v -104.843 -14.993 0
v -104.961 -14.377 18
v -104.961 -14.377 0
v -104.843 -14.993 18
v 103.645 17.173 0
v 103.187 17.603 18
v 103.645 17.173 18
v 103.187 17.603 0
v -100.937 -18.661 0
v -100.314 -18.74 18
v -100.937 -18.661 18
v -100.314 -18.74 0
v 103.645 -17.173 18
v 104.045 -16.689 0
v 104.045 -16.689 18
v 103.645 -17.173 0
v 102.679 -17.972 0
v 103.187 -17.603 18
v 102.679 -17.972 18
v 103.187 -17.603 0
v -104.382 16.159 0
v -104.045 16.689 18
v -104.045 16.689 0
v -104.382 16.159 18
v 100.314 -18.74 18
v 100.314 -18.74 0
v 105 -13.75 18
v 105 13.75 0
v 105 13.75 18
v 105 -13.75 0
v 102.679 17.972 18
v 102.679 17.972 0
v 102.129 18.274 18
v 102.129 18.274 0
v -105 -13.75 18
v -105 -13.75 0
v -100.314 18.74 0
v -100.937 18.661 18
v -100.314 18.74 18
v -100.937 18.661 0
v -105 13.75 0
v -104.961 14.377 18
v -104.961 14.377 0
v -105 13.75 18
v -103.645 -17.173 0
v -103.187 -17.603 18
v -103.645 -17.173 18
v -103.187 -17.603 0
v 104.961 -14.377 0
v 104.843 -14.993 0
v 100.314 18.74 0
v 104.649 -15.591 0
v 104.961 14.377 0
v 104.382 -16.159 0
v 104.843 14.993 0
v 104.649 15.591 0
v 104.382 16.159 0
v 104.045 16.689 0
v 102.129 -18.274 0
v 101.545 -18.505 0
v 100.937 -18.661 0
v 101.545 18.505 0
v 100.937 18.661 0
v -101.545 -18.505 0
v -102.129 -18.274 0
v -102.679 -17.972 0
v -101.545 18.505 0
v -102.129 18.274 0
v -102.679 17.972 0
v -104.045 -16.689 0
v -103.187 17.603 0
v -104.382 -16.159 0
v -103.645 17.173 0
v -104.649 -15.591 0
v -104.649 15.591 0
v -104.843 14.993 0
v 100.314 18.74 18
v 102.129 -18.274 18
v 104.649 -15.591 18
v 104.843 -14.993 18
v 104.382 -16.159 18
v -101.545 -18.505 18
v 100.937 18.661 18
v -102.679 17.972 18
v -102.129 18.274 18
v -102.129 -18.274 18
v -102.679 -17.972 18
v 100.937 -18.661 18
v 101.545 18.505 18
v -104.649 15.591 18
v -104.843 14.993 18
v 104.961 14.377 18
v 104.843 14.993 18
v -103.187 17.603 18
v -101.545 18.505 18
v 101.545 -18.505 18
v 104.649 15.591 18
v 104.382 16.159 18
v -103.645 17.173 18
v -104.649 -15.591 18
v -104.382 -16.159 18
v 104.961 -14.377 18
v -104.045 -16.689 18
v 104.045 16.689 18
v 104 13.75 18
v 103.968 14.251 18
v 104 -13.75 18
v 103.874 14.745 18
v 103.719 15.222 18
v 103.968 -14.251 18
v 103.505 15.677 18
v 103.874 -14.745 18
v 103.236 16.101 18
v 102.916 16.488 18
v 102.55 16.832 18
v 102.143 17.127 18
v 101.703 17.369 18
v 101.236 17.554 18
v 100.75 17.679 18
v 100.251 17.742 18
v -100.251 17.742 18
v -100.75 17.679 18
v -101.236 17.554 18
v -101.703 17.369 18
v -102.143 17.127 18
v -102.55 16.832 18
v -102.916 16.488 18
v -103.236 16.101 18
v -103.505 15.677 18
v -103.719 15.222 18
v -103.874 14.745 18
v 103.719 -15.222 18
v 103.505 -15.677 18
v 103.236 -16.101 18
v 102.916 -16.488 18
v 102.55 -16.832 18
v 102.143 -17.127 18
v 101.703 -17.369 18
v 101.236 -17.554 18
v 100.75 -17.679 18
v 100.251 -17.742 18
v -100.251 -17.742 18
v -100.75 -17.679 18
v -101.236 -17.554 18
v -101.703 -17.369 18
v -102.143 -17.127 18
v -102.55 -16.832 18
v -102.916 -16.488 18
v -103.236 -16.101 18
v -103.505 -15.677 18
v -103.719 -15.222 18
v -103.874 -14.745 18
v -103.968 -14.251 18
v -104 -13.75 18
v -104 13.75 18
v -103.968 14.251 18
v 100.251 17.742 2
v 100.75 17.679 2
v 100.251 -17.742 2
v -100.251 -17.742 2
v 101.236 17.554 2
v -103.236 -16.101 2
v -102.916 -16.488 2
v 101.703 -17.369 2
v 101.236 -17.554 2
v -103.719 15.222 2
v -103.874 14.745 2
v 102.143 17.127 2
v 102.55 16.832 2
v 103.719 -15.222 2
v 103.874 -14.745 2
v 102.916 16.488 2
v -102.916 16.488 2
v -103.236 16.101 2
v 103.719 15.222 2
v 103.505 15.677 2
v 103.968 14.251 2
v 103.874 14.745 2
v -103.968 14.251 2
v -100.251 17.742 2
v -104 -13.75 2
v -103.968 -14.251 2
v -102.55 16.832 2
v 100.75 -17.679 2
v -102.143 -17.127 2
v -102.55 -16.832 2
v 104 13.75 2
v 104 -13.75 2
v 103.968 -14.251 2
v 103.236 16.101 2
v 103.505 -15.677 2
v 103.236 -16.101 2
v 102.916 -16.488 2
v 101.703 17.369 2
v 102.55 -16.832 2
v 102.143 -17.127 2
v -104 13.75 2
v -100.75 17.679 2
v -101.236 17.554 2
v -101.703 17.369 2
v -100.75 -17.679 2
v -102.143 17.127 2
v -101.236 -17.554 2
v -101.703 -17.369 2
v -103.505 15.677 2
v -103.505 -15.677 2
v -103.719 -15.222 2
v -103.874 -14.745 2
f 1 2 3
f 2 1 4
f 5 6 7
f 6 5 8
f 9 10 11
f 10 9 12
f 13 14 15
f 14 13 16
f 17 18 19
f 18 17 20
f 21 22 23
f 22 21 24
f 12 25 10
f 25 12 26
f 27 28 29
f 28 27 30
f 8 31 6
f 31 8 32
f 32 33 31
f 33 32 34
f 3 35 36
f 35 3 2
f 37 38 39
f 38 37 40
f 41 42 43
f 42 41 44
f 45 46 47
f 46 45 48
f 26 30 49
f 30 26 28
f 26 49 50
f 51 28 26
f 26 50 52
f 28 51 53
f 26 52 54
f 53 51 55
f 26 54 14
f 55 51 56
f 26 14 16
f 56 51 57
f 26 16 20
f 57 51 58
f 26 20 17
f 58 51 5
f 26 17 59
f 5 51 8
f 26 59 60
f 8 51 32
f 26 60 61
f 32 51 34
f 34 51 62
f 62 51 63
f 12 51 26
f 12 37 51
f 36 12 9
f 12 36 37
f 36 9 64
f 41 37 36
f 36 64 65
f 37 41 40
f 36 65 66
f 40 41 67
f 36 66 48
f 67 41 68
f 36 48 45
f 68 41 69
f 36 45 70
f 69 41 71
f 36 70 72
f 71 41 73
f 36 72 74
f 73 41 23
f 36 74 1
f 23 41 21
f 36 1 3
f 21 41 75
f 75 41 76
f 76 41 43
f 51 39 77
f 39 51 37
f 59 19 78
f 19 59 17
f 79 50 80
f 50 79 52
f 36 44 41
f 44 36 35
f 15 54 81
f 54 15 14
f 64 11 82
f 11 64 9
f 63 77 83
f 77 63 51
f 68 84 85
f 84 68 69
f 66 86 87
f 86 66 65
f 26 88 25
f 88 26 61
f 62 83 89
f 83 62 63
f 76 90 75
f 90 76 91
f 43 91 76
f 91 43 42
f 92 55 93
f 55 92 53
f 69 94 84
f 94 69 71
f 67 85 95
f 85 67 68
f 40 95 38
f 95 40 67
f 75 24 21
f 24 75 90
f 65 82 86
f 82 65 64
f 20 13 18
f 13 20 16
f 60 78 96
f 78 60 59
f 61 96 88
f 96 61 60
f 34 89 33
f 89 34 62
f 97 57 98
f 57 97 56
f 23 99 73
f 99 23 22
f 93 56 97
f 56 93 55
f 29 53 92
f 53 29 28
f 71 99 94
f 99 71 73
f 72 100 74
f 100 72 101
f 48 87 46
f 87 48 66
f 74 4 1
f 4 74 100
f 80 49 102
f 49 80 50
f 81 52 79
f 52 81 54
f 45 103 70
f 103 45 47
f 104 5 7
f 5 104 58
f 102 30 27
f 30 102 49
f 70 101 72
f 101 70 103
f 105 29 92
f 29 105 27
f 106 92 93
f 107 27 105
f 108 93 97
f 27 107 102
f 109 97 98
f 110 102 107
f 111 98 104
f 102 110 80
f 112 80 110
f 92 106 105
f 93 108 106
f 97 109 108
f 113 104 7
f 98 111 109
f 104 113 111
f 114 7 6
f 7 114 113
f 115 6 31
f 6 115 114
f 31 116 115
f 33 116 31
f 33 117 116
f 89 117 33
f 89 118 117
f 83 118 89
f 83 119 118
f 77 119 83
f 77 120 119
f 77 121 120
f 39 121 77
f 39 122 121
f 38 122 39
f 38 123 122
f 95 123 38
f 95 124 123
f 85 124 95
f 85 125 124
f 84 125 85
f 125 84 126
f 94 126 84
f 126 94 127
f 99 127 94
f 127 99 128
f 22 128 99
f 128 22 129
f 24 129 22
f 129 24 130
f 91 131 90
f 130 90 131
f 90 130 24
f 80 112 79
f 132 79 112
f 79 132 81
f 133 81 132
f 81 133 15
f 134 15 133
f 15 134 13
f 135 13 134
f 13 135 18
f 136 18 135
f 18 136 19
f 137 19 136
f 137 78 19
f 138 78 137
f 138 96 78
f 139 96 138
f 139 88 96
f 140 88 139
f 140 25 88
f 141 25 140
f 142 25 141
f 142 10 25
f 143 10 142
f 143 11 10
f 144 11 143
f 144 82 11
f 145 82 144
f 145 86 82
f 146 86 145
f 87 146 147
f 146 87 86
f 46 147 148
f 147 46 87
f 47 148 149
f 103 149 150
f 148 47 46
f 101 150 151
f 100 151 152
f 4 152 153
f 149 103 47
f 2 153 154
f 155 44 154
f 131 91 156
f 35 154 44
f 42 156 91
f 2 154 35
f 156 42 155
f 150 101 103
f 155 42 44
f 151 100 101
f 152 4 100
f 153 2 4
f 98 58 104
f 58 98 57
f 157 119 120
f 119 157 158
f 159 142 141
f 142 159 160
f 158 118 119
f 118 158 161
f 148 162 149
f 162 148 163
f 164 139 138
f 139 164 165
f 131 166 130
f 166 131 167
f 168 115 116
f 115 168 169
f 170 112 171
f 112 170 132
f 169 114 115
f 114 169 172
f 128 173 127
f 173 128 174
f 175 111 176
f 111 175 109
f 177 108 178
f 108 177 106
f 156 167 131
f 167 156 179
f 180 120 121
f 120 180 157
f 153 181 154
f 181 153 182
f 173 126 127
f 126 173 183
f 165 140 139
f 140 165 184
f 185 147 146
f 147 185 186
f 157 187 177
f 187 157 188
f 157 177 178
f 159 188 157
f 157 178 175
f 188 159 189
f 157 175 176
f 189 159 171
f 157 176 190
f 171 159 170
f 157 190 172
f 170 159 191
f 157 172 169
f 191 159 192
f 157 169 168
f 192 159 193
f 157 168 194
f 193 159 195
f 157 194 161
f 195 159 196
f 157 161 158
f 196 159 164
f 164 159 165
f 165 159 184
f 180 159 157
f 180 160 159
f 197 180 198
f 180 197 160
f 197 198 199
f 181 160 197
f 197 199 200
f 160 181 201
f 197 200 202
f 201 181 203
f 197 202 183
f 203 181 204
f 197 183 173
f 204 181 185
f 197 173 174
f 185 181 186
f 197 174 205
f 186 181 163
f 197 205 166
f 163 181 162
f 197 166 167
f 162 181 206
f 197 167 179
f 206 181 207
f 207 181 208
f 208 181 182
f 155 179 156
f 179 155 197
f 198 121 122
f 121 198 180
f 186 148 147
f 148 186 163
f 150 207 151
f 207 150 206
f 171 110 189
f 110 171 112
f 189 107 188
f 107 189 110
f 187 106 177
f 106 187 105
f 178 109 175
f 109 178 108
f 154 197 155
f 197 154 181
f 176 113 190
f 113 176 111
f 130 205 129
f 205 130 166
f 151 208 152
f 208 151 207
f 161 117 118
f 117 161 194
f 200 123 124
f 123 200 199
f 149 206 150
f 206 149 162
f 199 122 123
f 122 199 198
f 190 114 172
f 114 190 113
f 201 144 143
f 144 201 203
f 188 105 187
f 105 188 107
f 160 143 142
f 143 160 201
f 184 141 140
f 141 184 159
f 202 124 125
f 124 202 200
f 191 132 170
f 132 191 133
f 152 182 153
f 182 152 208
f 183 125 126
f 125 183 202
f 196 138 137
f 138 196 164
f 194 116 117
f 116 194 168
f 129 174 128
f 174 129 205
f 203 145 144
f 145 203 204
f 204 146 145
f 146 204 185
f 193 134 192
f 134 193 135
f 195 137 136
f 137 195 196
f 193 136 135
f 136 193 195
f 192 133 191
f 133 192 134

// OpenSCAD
$fn = 50;


difference() {
	union() {
		hull() {
			translate(v = [-100.0000000000, 13.7500000000, 0]) {
				cylinder(h = 18, r = 5);
			}
			translate(v = [100.0000000000, 13.7500000000, 0]) {
				cylinder(h = 18, r = 5);
			}
			translate(v = [-100.0000000000, -13.7500000000, 0]) {
				cylinder(h = 18, r = 5);
			}
			translate(v = [100.0000000000, -13.7500000000, 0]) {
				cylinder(h = 18, r = 5);
			}
		}
	}
	union() {
		translate(v = [0, 0, 2]) {
			hull() {
				translate(v = [-100.0000000000, 13.7500000000, 0]) {
					cylinder(h = 16, r = 4);
				}
				translate(v = [100.0000000000, 13.7500000000, 0]) {
					cylinder(h = 16, r = 4);
				}
				translate(v = [-100.0000000000, -13.7500000000, 0]) {
					cylinder(h = 16, r = 4);
				}
				translate(v = [100.0000000000, -13.7500000000, 0]) {
					cylinder(h = 16, r = 4);
				}
			}
		}
	}
}
